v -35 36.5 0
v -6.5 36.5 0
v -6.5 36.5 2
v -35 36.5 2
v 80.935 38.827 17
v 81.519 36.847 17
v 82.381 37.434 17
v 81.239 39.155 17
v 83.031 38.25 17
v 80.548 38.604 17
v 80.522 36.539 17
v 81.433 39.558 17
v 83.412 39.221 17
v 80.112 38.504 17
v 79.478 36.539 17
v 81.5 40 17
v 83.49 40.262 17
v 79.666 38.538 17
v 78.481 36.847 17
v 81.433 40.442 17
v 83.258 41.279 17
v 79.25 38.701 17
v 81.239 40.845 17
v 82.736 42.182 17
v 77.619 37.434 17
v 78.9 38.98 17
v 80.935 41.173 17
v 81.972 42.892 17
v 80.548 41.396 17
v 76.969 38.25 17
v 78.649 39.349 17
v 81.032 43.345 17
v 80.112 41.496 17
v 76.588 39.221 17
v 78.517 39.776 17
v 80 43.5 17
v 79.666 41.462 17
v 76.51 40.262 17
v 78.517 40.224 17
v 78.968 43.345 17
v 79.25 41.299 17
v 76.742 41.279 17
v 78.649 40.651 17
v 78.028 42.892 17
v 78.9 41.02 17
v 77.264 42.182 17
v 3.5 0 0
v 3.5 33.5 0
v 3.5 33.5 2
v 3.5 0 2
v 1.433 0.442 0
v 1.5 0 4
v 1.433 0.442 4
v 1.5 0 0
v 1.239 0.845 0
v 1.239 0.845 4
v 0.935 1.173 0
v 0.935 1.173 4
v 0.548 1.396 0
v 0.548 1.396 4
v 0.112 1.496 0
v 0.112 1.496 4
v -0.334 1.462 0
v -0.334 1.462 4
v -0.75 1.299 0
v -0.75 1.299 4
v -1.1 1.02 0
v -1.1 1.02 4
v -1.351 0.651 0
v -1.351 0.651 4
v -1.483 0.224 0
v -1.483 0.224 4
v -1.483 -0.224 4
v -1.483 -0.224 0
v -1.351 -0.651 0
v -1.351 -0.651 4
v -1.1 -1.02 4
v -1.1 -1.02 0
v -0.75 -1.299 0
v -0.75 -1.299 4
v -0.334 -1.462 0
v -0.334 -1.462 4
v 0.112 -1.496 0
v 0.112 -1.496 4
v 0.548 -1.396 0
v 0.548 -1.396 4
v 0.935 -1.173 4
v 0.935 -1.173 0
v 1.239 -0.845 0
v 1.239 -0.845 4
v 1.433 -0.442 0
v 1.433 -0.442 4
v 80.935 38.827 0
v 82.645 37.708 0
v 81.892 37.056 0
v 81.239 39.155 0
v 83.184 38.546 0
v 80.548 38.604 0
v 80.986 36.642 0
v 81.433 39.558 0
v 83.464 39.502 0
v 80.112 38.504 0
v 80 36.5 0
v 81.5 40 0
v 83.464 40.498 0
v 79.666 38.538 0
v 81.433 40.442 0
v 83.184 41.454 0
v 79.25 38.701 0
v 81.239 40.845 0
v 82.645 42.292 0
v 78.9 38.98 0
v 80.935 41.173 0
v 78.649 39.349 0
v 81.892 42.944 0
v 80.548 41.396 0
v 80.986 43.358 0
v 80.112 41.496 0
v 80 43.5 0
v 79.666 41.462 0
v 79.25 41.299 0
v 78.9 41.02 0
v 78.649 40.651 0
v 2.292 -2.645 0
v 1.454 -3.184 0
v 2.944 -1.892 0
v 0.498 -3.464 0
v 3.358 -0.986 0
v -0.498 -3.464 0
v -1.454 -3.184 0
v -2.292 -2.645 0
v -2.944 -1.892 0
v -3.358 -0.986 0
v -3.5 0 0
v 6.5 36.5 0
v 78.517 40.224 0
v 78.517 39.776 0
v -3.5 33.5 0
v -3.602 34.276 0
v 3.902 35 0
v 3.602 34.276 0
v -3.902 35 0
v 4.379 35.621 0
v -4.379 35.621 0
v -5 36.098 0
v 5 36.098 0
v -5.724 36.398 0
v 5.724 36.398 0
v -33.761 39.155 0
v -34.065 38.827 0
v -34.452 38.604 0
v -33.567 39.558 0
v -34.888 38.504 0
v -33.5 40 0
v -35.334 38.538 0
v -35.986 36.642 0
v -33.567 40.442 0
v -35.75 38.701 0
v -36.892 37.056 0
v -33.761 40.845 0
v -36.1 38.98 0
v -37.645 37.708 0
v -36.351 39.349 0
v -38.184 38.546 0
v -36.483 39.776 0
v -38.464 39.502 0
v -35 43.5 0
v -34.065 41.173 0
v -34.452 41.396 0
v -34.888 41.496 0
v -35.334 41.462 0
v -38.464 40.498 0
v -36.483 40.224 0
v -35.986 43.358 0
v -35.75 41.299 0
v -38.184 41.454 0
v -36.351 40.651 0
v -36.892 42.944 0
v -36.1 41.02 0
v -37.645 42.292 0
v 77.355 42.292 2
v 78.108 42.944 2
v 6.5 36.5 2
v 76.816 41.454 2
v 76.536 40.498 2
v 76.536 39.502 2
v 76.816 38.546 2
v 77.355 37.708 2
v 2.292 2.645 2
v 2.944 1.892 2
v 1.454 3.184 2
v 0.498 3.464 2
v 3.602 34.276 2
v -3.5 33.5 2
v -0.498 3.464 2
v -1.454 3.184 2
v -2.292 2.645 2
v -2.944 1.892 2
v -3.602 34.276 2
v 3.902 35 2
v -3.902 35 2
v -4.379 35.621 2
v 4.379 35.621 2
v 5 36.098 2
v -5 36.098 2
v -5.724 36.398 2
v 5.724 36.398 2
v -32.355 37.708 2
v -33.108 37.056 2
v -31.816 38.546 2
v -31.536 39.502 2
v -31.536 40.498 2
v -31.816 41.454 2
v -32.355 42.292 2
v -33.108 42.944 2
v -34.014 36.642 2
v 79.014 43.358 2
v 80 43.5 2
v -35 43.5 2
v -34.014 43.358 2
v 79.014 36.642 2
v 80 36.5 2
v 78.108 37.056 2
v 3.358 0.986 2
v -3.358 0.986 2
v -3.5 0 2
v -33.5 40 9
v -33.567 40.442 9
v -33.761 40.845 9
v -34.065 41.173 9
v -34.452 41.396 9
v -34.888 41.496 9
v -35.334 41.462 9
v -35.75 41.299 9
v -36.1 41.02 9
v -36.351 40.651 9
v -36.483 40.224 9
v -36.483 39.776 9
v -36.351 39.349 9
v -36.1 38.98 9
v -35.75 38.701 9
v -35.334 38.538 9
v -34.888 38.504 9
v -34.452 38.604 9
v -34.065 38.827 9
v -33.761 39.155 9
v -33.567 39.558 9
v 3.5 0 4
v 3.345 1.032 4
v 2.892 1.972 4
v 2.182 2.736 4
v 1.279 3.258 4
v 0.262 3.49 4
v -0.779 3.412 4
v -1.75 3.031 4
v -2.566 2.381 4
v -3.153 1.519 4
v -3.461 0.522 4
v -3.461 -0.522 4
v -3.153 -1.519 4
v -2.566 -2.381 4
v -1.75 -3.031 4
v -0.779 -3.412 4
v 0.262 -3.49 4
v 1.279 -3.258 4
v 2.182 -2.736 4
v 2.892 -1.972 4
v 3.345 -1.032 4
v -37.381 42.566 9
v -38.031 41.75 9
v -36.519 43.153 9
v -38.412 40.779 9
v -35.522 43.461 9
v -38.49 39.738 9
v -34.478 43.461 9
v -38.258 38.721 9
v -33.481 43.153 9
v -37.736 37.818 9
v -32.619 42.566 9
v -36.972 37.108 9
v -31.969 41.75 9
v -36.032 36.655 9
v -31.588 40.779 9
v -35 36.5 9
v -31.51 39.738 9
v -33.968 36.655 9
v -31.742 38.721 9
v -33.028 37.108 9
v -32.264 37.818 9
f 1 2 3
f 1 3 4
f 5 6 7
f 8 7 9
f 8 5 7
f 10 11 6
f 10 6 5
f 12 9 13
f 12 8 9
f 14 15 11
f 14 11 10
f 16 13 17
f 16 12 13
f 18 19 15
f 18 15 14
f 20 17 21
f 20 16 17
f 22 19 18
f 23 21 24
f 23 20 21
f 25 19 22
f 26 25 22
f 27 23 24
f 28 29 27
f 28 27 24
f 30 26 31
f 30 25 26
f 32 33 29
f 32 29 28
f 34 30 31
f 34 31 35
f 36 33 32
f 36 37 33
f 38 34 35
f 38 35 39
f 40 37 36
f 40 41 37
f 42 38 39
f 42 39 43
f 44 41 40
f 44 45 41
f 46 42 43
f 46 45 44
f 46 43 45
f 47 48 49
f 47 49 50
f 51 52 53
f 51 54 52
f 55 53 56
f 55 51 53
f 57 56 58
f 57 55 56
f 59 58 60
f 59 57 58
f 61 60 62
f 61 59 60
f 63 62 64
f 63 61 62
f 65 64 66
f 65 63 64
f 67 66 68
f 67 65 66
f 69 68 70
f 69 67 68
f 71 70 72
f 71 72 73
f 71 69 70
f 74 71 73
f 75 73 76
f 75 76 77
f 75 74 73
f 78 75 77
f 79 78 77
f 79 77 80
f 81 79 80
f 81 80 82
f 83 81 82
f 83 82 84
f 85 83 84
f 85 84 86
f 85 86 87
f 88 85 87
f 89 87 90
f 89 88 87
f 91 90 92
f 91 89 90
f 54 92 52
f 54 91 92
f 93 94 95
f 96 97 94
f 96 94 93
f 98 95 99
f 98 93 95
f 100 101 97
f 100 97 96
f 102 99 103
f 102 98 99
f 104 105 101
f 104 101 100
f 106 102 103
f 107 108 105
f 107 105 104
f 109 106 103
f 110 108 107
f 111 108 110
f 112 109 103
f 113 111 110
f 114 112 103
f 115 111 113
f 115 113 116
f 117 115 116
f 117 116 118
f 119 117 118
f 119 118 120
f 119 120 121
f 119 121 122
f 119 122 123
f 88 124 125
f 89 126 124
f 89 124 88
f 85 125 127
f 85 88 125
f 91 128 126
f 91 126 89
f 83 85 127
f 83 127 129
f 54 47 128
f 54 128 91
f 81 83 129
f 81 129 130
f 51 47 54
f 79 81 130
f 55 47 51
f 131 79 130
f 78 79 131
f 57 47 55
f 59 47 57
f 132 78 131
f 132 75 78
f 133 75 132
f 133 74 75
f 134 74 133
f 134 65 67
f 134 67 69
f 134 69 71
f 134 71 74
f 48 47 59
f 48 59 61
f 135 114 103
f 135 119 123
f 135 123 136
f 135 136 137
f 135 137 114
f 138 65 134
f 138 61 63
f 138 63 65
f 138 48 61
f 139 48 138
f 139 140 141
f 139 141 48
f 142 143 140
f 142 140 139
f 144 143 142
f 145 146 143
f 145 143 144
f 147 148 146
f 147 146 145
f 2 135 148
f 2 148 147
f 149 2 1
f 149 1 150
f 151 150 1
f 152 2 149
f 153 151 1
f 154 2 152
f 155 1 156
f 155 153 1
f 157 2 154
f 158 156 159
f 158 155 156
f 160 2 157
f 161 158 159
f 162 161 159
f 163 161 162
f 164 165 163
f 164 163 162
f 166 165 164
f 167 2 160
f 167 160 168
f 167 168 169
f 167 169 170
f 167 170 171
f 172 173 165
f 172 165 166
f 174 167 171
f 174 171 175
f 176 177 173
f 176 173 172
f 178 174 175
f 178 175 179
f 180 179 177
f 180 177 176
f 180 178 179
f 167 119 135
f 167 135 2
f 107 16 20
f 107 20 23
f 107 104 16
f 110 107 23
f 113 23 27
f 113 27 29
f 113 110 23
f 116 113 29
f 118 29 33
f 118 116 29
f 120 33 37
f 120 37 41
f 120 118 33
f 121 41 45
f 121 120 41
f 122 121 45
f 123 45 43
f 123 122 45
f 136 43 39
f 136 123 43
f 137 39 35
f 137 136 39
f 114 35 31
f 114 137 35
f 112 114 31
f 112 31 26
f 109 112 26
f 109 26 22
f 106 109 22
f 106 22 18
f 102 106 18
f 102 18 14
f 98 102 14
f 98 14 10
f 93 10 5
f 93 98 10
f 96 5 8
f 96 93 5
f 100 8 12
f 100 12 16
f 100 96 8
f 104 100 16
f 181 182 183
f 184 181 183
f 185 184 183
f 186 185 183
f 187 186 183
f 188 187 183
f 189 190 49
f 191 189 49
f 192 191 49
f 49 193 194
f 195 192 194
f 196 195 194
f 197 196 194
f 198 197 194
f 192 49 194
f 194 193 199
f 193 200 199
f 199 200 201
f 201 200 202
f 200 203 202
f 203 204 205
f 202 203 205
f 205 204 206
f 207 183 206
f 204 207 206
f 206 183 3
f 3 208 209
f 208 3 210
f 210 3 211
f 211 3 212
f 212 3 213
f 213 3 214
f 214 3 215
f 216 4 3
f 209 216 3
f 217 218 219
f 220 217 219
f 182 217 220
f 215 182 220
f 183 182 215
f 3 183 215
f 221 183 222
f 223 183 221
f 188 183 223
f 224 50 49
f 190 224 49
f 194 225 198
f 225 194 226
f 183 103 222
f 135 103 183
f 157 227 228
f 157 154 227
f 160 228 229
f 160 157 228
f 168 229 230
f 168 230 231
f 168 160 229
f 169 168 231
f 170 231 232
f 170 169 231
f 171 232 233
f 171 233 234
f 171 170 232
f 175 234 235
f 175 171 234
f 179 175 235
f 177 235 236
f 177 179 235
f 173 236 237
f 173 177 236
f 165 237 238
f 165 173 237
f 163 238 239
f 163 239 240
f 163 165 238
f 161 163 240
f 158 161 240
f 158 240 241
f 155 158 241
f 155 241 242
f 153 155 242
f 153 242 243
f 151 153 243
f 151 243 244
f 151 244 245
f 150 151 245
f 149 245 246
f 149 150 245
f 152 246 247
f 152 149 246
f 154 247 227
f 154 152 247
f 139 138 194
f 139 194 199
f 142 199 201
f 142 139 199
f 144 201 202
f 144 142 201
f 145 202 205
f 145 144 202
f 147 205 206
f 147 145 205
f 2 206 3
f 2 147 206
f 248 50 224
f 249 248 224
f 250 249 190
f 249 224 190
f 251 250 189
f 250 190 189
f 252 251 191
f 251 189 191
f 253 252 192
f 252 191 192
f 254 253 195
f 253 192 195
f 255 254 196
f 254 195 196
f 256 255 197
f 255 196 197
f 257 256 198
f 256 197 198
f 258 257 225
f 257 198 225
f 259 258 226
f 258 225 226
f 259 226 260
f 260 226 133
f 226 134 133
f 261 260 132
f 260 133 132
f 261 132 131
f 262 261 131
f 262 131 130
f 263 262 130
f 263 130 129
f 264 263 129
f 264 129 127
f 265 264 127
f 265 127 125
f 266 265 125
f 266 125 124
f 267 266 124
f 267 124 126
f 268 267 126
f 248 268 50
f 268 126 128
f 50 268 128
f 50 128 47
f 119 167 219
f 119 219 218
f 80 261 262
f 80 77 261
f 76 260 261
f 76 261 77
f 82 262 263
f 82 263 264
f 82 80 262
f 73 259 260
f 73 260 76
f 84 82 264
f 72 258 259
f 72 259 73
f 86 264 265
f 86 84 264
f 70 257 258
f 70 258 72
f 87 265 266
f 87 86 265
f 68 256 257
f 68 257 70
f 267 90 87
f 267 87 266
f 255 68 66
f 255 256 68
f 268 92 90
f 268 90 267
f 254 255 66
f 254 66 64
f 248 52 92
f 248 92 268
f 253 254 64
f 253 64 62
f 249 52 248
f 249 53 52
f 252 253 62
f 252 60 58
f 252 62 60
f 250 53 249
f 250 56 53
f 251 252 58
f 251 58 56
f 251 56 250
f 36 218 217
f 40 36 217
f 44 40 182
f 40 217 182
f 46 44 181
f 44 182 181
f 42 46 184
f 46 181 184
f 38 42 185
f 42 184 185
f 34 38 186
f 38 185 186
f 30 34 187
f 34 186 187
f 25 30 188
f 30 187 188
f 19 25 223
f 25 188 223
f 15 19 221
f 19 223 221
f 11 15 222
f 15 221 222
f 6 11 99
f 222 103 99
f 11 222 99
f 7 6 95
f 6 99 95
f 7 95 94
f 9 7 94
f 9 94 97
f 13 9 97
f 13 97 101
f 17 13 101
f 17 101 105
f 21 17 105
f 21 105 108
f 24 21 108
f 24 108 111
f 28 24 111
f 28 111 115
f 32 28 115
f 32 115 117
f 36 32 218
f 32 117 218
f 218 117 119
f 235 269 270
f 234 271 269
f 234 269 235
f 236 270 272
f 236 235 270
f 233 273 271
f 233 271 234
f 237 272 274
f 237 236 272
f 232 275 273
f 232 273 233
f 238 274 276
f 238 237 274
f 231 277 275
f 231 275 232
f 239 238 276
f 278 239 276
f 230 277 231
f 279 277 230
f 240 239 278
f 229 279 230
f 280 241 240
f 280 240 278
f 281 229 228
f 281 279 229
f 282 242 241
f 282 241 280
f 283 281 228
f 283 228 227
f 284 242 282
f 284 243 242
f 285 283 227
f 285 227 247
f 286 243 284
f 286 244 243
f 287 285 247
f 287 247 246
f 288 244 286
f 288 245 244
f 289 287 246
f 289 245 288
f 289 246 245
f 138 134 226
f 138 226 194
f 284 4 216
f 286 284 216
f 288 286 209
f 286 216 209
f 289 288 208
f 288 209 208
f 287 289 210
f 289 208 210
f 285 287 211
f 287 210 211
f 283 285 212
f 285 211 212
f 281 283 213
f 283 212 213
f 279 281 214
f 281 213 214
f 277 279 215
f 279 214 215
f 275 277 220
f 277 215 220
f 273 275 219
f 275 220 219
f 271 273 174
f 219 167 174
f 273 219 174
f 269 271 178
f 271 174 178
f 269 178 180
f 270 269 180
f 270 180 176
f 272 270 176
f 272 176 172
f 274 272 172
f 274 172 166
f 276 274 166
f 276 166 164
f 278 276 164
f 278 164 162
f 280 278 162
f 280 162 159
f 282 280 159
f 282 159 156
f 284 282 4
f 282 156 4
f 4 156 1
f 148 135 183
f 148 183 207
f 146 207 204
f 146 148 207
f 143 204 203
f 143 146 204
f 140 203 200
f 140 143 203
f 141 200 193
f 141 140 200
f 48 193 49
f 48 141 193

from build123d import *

# Parameters (mm, degrees)
SKETCH1_R           = 1.5
BOSS_EXTRUDE1_DEPTH = 2
SKETCH2_R           = 3.5
SKETCH2_R_2         = 1.5
BOSS_EXTRUDE2_DEPTH = 7
SKETCH3_R           = 3.5
SKETCH3_R_2         = 1.5
BOSS_EXTRUDE3_DEPTH = 15
SKETCH4_R           = 3.5
SKETCH4_R_2         = 1.5
BOSS_EXTRUDE4_DEPTH = 2


with BuildPart() as part:
    # Sketch1 → Boss-Extrude1 (new body)
    with BuildSketch(Plane.XY):
        with BuildLine():
            Line((-35, 43.5), (80, 43.5))
            ThreePointArc((80, 43.5), (83.5, 40), (80, 36.5))
            Line((80, 36.5), (6.5, 36.5))
            ThreePointArc((6.5, 36.5), (4.378679656, 35.621320344), (3.5, 33.5))
            Line((3.5, 33.5), (3.5, 0))
            ThreePointArc((3.5, 0), (0, -3.5), (-3.5, 0))
            Line((-3.5, 0), (-3.5, 33.5))
            ThreePointArc((-3.5, 33.5), (-4.378679656, 35.621320344), (-6.5, 36.5))
            Line((-6.5, 36.5), (-35, 36.5))
            ThreePointArc((-35, 36.5), (-38.5, 40), (-35, 43.5))
        make_face()
        with Locations((-35, 40)):
            Circle(SKETCH1_R, mode=Mode.SUBTRACT)
        with Locations((80, 40)):
            Circle(SKETCH1_R, mode=Mode.SUBTRACT)
        Circle(SKETCH1_R, mode=Mode.SUBTRACT)
    extrude(amount=BOSS_EXTRUDE1_DEPTH)

    # Sketch2 → Boss-Extrude2 (add)
    with BuildSketch(Plane.XY.offset(2)):
        with Locations(Location((-35, 40, 0), (0, 0, 270))):
            Circle(SKETCH2_R)
        with Locations((-35, 40)):
            Circle(SKETCH2_R_2, mode=Mode.SUBTRACT)
    extrude(amount=BOSS_EXTRUDE2_DEPTH)

    # Sketch3 → Boss-Extrude3 (add)
    with BuildSketch(Plane.XY.offset(2)):
        with Locations(Location((80, 40, 0), (0, 0, 90))):
            Circle(SKETCH3_R)
        with Locations((80, 40)):
            Circle(SKETCH3_R_2, mode=Mode.SUBTRACT)
    extrude(amount=BOSS_EXTRUDE3_DEPTH)

    # Sketch4 → Boss-Extrude4 (add)
    with BuildSketch(Plane.XY.offset(2)):
        Circle(SKETCH4_R)
        Circle(SKETCH4_R_2, mode=Mode.SUBTRACT)
    extrude(amount=BOSS_EXTRUDE4_DEPTH)


solid = part.part
